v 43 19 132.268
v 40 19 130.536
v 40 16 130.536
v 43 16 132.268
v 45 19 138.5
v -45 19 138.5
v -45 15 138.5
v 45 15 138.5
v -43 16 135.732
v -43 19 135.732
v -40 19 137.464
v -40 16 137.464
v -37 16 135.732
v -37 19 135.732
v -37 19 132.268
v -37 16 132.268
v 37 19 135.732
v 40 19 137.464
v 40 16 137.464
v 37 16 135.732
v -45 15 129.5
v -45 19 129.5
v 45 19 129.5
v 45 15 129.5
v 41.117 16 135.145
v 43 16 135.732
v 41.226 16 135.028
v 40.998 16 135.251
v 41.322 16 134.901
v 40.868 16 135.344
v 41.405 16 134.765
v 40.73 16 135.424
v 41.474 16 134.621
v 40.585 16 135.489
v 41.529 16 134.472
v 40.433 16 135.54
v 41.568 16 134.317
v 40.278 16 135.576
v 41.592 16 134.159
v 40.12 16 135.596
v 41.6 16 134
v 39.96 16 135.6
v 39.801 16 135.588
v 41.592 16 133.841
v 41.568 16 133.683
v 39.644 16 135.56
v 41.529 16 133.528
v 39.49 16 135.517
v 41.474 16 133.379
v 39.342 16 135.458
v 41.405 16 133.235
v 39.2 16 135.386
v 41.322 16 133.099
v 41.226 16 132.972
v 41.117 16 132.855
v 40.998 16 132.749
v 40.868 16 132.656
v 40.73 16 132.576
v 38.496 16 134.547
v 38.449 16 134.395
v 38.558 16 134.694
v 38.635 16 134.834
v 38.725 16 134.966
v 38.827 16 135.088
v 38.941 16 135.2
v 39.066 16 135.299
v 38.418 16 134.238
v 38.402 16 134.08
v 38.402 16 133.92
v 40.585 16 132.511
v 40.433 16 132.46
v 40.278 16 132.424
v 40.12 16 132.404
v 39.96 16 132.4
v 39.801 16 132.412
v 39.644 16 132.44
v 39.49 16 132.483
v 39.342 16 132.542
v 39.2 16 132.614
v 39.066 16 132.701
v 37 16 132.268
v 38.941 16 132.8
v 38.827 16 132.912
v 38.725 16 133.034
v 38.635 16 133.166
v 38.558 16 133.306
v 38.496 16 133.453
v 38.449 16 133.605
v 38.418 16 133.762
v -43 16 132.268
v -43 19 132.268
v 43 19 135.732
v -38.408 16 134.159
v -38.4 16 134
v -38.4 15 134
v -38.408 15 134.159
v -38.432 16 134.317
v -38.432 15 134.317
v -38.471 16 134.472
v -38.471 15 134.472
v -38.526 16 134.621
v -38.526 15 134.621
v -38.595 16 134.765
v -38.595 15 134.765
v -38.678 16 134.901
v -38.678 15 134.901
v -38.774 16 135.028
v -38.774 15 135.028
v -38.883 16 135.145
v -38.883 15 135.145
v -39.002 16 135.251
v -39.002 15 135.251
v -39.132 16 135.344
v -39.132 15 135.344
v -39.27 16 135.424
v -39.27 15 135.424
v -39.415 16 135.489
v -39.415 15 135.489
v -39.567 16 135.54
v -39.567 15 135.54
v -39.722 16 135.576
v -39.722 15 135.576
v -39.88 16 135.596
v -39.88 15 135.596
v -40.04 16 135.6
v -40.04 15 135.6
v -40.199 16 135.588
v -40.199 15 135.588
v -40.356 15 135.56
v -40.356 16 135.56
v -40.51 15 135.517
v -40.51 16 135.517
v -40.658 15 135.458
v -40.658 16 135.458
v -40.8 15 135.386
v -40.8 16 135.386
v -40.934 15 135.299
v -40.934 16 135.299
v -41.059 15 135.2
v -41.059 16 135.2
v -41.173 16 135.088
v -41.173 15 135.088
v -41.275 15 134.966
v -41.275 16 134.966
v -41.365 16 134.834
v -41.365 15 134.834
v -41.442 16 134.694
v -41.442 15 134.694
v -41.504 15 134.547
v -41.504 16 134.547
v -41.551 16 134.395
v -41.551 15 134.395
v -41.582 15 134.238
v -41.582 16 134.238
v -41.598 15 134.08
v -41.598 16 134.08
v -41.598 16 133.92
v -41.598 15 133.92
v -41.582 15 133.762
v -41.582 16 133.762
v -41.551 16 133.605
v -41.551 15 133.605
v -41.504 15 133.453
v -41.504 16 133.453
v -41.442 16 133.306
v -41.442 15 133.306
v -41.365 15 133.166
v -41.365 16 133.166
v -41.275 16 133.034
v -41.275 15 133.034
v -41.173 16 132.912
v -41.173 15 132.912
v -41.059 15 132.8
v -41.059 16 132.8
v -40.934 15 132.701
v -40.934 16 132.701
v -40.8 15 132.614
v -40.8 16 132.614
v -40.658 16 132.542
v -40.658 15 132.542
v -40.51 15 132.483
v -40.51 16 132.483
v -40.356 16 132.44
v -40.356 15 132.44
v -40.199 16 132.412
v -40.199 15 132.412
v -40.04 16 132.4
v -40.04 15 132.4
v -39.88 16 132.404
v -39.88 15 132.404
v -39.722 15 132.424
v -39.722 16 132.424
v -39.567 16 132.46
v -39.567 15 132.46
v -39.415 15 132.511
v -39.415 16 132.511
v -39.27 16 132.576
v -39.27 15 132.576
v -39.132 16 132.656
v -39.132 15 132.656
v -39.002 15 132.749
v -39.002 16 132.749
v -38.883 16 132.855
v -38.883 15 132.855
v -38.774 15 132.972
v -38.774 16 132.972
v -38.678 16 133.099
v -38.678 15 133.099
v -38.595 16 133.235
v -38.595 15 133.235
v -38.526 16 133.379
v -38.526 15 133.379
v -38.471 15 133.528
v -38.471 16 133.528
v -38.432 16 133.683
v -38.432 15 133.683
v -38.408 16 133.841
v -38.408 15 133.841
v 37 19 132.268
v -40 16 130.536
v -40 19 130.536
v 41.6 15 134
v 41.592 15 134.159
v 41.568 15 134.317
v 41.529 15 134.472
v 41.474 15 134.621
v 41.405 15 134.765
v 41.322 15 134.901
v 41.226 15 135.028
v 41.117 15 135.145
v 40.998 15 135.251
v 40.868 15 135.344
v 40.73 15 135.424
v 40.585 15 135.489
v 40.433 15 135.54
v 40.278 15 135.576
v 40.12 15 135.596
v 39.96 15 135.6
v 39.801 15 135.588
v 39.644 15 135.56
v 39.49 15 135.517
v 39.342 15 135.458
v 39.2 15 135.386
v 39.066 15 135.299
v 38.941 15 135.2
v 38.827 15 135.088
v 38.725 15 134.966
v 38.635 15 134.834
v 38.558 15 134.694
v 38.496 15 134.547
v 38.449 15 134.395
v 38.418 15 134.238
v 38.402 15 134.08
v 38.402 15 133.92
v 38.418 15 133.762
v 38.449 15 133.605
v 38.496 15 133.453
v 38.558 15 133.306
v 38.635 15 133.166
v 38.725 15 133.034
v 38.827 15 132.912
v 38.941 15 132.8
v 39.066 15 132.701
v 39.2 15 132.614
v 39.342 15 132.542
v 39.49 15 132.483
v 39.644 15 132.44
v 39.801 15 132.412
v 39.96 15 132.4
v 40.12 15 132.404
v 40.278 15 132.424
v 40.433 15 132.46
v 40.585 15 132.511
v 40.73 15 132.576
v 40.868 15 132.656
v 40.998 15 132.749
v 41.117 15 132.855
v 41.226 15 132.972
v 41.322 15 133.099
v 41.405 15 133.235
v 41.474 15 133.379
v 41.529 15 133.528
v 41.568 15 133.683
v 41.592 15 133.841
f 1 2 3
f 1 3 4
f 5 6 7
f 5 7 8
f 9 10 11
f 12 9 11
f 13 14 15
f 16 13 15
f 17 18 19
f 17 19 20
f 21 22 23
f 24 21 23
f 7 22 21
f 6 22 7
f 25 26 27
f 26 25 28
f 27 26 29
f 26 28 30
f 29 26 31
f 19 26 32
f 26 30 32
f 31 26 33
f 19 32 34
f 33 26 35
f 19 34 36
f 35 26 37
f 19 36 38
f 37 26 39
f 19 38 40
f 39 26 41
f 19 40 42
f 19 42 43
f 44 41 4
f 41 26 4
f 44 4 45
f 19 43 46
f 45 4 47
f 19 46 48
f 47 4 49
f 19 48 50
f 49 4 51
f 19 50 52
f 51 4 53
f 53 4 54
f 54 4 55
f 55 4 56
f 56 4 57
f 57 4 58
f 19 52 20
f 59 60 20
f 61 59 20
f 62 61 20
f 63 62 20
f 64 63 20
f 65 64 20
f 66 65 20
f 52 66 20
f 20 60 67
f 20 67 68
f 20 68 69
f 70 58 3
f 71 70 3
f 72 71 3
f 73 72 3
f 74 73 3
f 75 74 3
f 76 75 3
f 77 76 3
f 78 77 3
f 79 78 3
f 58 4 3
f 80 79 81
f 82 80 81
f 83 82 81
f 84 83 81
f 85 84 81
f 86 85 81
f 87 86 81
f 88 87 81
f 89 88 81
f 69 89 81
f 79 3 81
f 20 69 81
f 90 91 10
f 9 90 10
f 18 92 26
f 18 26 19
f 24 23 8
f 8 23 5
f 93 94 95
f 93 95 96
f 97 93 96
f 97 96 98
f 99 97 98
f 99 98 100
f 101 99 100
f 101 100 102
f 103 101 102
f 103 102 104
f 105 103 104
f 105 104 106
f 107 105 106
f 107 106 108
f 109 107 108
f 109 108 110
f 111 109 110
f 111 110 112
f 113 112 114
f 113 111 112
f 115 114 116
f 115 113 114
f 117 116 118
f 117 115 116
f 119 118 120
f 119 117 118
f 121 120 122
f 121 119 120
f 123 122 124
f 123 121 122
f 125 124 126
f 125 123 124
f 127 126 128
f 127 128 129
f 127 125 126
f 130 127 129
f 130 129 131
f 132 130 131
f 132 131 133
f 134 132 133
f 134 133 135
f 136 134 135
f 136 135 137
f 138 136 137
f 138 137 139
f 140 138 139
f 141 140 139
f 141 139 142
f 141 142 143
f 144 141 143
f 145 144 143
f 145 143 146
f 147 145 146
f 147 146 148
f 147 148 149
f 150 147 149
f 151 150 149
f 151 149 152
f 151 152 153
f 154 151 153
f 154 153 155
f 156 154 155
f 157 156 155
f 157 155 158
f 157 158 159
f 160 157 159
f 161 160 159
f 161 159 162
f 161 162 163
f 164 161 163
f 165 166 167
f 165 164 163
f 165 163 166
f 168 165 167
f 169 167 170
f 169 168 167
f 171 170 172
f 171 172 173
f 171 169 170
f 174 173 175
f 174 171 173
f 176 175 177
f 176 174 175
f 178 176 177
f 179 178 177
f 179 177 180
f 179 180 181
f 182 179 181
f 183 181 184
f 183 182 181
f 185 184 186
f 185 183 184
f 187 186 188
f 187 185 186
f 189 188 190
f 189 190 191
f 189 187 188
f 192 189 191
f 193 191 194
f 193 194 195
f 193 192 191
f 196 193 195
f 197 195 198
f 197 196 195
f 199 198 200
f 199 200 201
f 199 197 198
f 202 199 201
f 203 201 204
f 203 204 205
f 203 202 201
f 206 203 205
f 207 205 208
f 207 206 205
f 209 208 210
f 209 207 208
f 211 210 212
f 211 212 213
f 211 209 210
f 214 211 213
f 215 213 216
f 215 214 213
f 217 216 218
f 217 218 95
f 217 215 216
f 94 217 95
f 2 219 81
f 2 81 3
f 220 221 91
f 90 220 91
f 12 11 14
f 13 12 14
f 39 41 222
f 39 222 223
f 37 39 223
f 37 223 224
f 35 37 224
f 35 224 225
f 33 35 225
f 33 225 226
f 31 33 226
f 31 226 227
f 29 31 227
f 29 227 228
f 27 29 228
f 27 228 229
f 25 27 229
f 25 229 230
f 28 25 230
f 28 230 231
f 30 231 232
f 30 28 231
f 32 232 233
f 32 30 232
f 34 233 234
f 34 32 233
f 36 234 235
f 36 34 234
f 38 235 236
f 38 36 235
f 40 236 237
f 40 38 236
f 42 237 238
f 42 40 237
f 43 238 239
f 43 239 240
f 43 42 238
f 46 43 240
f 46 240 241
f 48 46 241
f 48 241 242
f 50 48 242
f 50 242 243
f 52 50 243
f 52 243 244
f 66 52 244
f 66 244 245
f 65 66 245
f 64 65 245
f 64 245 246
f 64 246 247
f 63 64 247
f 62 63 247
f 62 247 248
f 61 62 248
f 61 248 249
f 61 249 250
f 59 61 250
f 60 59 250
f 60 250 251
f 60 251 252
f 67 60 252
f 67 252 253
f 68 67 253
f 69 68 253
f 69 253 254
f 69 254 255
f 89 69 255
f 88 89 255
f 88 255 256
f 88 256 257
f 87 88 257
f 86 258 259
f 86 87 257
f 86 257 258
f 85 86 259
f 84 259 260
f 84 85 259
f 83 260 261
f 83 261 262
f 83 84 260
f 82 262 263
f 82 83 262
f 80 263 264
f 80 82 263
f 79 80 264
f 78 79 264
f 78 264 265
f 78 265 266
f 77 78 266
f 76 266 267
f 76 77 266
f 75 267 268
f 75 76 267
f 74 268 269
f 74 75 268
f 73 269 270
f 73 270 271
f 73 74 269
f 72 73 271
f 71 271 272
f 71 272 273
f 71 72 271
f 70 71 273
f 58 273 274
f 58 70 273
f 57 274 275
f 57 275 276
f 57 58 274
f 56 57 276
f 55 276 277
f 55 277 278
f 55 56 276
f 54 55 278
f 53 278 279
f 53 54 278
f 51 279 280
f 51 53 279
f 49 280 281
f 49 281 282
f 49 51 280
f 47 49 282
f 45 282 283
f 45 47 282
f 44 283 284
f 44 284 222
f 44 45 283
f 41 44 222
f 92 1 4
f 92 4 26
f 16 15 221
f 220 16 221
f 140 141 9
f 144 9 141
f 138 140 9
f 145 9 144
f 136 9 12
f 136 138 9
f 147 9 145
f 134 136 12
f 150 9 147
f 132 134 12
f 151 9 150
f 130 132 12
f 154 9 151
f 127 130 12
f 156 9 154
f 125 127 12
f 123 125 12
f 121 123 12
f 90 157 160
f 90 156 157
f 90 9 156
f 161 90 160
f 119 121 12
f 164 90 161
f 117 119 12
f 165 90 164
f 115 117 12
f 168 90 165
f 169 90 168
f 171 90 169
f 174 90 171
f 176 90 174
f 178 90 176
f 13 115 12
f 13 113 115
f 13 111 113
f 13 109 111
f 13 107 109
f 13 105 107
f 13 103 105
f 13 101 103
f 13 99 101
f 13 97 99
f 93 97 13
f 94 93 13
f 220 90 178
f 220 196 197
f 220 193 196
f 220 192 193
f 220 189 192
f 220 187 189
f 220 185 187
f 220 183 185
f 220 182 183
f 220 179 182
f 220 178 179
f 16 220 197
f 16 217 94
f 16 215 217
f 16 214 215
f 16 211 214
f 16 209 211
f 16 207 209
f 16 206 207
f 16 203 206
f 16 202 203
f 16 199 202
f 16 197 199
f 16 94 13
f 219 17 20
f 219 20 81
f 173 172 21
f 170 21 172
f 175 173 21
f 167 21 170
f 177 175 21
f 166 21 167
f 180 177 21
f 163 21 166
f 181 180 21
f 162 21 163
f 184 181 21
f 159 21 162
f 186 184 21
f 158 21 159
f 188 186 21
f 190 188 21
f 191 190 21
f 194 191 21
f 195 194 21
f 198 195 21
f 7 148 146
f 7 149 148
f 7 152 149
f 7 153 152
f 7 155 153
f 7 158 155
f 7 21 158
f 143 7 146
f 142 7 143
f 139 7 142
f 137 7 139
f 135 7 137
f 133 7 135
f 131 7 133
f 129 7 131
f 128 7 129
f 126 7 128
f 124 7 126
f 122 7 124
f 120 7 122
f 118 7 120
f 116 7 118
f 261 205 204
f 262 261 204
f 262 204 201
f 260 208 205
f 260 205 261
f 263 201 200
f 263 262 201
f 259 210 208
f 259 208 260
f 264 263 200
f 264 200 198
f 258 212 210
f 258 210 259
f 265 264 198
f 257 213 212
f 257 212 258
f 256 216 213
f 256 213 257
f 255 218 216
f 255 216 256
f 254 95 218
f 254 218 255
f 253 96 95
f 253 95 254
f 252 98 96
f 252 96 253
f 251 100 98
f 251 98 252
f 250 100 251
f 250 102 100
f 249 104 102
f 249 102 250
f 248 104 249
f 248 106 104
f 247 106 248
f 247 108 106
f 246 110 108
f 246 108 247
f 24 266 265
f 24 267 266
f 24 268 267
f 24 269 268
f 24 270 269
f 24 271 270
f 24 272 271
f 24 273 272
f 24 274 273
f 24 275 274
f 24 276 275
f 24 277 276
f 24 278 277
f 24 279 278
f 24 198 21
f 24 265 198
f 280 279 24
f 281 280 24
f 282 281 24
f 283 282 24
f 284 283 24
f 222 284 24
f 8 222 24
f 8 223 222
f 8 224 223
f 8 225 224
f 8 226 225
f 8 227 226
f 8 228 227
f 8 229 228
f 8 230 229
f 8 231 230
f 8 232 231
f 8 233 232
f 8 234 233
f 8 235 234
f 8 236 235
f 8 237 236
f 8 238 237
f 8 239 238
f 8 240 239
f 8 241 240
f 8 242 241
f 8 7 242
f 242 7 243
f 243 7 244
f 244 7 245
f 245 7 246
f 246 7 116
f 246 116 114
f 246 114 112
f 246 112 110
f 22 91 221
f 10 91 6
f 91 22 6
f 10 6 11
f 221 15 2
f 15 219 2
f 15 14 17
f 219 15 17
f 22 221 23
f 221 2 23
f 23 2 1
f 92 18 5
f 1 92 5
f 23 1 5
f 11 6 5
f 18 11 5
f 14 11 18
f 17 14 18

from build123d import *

# Parameters (mm, degrees)
SKETCH089_W     = 90
SKETCH089_H     = 9
SKETCH089_R     = 1.6
PAD034_DEPTH    = 4
POCKET055_DEPTH = 3


with BuildPart() as part:
    # Sketch089 → Pad034 (new body)
    with BuildSketch(Plane.XZ):
        with Locations((0, 34)):
            Rectangle(SKETCH089_W, SKETCH089_H)
        with Locations((-40, 34)):
            Circle(SKETCH089_R, mode=Mode.SUBTRACT)
        with Locations((40, 34)):
            Circle(SKETCH089_R, mode=Mode.SUBTRACT)
    extrude(amount=PAD034_DEPTH)

    # Sketch090 (on Face7 of Pad034) → Pocket055 (cut)
    with BuildSketch(Plane(origin=(0, 0, 0), x_dir=(1, 0, 0), z_dir=(0, 1, 0))):
        Polygon((-37, -32.267949), (-40, -30.535898), (-43, -32.267949), (-43, -35.732051), (-40, -37.464102), (-37, -35.732051), align=None)
    pocket055 = extrude(amount=-POCKET055_DEPTH, mode=Mode.SUBTRACT)

    # Mirrored005: Pocket055 across Sketch090 V_Axis
    add(pocket055.mirror(Plane.YZ), mode=Mode.SUBTRACT)


with BuildPart() as part_1:
    # Body012 placement: moved
    add(part.part.moved(Location((0, 19, 100))))


solid = part_1.part
